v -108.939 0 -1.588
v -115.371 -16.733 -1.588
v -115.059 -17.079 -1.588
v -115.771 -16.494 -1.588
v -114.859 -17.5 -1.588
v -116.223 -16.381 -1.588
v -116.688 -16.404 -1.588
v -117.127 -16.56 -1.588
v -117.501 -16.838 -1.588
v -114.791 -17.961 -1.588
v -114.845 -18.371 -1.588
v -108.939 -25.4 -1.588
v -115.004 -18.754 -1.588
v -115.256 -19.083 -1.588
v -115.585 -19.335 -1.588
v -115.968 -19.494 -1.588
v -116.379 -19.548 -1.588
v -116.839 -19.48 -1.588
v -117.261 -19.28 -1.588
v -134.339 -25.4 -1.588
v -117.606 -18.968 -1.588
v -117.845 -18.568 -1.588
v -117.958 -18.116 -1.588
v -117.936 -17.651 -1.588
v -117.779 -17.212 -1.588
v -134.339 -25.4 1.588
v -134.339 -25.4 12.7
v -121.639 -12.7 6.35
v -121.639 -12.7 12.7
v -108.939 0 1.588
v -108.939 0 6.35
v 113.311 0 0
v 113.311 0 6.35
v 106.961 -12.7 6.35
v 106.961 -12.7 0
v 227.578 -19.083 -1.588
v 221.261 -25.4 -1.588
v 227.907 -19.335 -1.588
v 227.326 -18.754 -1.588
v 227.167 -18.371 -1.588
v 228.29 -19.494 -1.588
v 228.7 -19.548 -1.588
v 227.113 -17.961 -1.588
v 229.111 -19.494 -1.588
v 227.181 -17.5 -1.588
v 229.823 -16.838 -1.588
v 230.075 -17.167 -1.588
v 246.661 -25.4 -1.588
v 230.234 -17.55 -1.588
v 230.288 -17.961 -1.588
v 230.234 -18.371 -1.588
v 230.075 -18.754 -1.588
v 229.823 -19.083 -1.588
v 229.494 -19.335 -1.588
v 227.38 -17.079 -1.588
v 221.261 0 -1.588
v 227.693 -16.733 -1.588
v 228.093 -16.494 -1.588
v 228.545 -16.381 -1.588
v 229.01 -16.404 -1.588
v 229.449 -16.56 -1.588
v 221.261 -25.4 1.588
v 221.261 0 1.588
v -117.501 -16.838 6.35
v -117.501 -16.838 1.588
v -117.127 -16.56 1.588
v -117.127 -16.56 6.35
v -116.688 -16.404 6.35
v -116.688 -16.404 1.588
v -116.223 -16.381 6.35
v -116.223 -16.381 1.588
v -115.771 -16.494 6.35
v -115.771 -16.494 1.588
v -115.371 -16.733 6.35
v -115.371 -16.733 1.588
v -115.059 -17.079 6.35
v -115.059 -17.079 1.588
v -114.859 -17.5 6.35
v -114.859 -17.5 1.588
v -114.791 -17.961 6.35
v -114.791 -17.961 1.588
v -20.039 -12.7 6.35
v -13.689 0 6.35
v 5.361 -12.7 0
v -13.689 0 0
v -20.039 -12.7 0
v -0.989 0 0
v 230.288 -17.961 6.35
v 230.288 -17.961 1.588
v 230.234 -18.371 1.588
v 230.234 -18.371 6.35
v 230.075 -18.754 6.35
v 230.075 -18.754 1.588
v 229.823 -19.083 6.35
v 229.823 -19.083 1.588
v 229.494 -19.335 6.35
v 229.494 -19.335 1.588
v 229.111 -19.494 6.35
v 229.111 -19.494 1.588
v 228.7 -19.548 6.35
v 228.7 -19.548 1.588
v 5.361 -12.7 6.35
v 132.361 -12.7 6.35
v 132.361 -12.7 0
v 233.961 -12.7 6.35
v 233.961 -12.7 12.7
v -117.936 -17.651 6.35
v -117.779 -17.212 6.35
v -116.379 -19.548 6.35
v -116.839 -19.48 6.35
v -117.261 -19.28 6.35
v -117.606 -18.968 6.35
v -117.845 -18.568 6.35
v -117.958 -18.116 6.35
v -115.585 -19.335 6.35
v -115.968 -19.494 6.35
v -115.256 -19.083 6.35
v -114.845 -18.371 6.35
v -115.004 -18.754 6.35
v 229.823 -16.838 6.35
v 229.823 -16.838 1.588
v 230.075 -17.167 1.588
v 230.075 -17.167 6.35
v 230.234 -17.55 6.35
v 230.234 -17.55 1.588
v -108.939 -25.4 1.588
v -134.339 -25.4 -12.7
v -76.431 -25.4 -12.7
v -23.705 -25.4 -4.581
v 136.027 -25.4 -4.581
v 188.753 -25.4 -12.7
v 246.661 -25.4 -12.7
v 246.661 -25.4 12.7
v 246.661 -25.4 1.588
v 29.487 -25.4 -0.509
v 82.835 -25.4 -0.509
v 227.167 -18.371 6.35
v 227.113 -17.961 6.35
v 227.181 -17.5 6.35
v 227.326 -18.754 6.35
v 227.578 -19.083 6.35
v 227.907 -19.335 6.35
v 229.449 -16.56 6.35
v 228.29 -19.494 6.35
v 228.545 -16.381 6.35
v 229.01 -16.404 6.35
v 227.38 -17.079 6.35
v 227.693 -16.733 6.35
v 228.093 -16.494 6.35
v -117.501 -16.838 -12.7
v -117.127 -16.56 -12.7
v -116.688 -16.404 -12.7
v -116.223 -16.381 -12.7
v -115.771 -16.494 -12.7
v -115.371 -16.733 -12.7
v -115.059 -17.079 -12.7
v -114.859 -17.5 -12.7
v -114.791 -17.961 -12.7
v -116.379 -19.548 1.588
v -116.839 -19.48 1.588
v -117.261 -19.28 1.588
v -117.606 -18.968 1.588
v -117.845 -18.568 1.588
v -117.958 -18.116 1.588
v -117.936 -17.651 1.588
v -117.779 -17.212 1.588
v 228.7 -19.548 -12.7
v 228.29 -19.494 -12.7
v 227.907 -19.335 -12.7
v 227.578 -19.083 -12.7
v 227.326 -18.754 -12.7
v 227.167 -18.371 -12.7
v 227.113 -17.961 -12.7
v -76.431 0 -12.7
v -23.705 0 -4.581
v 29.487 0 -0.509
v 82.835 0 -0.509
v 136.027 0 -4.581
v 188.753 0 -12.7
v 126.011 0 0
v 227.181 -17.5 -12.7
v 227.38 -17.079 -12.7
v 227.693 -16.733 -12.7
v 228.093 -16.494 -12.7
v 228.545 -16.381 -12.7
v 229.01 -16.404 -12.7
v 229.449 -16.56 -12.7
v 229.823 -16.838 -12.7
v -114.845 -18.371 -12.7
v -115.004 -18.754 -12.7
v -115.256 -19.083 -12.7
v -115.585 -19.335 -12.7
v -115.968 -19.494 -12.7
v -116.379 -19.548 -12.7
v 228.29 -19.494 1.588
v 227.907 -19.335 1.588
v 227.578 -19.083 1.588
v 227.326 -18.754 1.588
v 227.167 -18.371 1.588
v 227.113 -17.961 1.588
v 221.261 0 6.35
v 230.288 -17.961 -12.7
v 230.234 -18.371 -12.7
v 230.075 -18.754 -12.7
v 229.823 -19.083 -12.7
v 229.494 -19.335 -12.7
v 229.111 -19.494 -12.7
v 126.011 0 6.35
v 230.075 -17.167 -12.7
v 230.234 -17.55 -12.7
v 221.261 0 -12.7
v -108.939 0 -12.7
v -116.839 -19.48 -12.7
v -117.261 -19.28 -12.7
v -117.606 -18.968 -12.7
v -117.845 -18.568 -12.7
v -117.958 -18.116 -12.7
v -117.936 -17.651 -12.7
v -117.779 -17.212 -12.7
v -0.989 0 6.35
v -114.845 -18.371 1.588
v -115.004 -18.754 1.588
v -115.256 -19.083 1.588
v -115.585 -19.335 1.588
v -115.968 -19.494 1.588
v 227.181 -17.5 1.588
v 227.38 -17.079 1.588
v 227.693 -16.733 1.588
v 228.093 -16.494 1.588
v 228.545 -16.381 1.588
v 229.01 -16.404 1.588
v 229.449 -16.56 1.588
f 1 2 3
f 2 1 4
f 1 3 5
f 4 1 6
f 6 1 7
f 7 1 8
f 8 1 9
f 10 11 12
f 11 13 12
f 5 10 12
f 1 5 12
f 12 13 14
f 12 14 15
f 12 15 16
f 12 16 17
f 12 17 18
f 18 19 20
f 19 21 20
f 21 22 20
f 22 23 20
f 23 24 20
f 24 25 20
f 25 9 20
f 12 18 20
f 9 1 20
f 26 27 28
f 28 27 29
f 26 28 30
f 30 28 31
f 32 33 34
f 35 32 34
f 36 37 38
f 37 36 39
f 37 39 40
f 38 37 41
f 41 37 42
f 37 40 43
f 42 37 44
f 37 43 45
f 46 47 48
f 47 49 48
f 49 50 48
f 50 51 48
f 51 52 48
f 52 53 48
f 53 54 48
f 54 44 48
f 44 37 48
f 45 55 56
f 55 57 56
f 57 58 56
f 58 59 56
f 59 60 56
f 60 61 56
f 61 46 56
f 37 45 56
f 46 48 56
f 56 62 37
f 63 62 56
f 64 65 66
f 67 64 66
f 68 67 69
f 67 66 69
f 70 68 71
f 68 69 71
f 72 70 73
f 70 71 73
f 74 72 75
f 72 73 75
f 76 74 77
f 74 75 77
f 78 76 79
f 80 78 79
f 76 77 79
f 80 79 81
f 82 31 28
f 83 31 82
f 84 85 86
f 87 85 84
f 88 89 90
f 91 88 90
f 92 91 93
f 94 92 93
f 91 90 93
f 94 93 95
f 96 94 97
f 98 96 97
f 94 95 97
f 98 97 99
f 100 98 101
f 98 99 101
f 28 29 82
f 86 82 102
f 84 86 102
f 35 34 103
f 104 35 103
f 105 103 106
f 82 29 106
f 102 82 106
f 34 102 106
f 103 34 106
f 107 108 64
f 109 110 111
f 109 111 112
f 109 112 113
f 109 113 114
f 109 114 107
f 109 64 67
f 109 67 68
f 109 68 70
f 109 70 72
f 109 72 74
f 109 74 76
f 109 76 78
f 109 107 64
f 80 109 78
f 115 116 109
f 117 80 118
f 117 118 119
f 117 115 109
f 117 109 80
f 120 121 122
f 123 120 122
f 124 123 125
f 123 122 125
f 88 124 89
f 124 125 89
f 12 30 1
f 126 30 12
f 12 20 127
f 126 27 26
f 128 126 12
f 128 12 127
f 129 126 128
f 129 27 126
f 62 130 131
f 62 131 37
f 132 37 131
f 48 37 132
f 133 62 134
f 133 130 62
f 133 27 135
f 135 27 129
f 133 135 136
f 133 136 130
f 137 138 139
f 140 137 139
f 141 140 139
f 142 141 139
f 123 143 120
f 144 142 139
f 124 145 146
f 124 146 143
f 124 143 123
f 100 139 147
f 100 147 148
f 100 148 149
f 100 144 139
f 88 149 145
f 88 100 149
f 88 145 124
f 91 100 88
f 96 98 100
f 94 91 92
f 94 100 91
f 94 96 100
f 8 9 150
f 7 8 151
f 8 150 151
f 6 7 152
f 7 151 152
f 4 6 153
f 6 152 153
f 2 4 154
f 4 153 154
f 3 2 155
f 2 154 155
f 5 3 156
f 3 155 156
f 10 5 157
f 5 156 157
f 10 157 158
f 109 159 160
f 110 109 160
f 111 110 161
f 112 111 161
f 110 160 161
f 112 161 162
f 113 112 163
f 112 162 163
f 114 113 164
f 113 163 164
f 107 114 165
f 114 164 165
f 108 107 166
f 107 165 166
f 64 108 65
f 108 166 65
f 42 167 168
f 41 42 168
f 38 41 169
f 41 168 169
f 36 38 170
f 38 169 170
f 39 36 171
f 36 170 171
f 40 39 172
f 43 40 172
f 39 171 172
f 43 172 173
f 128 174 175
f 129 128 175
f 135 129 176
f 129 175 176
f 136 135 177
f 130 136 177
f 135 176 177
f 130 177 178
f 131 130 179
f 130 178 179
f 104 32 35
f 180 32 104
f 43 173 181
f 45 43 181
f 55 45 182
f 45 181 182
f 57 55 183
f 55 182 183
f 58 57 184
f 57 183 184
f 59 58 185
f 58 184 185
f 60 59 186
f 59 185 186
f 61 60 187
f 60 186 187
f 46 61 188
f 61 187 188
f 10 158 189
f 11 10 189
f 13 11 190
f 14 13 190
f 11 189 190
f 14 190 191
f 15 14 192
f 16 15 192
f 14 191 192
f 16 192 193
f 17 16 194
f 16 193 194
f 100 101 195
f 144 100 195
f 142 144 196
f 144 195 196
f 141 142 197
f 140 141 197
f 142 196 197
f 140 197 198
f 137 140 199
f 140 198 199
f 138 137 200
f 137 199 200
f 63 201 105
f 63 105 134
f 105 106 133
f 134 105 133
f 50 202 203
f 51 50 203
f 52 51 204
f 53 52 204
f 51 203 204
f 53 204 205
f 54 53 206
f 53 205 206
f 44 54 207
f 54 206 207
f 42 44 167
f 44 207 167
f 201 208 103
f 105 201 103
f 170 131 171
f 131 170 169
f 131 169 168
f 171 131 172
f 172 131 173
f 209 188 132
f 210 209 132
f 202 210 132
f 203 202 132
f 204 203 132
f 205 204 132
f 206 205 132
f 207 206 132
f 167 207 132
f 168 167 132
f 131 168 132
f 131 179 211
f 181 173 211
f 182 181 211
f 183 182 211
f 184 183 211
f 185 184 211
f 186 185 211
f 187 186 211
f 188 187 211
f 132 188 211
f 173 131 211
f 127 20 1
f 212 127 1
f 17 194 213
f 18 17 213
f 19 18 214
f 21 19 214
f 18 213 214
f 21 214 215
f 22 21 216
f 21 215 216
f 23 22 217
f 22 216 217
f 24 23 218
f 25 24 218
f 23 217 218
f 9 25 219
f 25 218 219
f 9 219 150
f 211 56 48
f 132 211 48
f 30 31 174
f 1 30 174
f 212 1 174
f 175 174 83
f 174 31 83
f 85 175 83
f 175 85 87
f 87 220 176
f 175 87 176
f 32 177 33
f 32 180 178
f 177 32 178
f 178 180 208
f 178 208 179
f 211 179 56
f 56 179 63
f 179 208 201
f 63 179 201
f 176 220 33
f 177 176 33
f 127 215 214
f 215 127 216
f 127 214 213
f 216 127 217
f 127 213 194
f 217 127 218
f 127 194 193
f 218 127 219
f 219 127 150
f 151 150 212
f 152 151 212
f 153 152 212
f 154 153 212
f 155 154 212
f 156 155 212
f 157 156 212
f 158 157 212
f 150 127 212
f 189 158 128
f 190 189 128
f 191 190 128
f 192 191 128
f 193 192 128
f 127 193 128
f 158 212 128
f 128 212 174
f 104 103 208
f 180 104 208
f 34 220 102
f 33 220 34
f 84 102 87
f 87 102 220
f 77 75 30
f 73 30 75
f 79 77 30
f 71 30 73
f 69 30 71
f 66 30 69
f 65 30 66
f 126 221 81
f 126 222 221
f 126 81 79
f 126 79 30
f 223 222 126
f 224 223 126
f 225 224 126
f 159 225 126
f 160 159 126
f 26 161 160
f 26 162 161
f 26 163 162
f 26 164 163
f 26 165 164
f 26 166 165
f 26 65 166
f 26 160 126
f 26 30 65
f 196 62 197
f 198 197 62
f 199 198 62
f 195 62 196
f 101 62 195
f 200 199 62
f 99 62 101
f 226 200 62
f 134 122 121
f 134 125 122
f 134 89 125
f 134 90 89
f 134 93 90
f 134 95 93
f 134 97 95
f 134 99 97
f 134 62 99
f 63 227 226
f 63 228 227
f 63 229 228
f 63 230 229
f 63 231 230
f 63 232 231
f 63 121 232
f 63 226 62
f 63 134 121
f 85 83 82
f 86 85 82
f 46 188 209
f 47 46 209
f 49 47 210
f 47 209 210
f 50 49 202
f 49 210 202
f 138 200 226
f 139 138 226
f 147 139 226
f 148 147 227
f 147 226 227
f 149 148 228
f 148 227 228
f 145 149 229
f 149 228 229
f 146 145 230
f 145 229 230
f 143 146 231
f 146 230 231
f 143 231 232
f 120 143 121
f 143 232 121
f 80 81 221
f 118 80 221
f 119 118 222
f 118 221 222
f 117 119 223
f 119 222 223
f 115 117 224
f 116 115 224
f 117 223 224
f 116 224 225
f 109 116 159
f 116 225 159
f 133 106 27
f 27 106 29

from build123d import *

# Parameters (mm, degrees)
F1_DEPTH  = 25.4
F2_W      = 25.4
F2_H      = 3.175
F3_DEPTH  = 25.4
F4_W      = 25.4
F4_H      = 3.175
F5_DEPTH  = 25.4
F7_DEPTH  = 25.4
F8_DEPTH  = 6.35
F10_DEPTH = 6.35
F13_DEPTH = 19.05


with BuildPart() as f1:
    # F0 (on Front) → F1 (new body)
    with BuildSketch(Plane.XZ):
        with BuildLine():
            Line((246.660952732, 12.7), (-134.339047268, 12.7))
            Line((-134.339047268, 12.7), (-134.339047268, -12.7))
            Line((-134.339047268, -12.7), (-76.4309399312, -12.7))
            ThreePointArc((-76.4309399312, -12.7), (56.160952732, 0), (188.7528453951, -12.7))
            Line((188.7528453951, -12.7), (246.660952732, -12.7))
            Line((246.660952732, -12.7), (246.660952732, 12.7))
        make_face()
    extrude(amount=F1_DEPTH)

    # F2 (on face) → F3 (cut)
    with BuildSketch(Plane.YZ.offset(246.660952732)):
        with Locations((-12.7, 0)):
            Rectangle(F2_W, F2_H)
    extrude(amount=-F3_DEPTH, mode=Mode.SUBTRACT)

    # F4 (on face) → F5 (cut)
    with BuildSketch(Plane(origin=(-134.339047268, 0, 0), x_dir=(0, -1, 0), z_dir=(-1, 0, 0))):
        with Locations((12.7, 0)):
            Rectangle(F4_W, F4_H)
    extrude(amount=-F5_DEPTH, mode=Mode.SUBTRACT)

    # F6 (on face) → F7 (cut)
    with BuildSketch(Plane.XY.offset(12.7)):
        Polygon((-134.339047268, 0), (-134.339047268, -25.4), (-121.639047268, -12.7), (-108.939047268, 0), align=None)
        Polygon((233.960952732, -12.7), (246.660952732, -25.4), (246.660952732, 0), (221.260952732, 0), align=None)
    extrude(amount=-F7_DEPTH, mode=Mode.SUBTRACT)

    # F6 (on face) → F8 (cut)
    with BuildSketch(Plane.XY.offset(12.7)):
        Polygon((-108.939047268, 0), (-121.639047268, -12.7), (233.960952732, -12.7), (221.260952732, 0), align=None)
    extrude(amount=-F8_DEPTH, mode=Mode.SUBTRACT)

    # F9 (on face) → F10 (cut)
    with BuildSketch(Plane.XY.offset(6.35)):
        Polygon((-0.989047268, 0), (-13.689047268, 0), (-20.039047268, -12.7), (5.360952732, -12.7), align=None)
        Polygon((126.010952732, 0), (113.310952732, 0), (106.960952732, -12.7), (132.360952732, -12.7), align=None)
    extrude(amount=-F10_DEPTH, mode=Mode.SUBTRACT)

    # F11 (on face) + F12 (on face) → F13 (cut)
    with BuildSketch(Plane(origin=(0, 0, -12.7), x_dir=(1, 0, 0), z_dir=(0, 0, -1))):
        with BuildLine():
            ThreePointArc((-116.3785350259, 19.5480122421), (-117.8451937838, 18.568022191), (-117.501067041, 16.837980227))
            Line((-117.501067041, 16.837980227), (-116.3785350259, 17.9605122421))
            Line((-116.3785350259, 17.9605122421), (-116.3785350259, 19.5480122421))
        make_face()
        with BuildLine():
            Line((-116.3785350259, 17.9605122421), (-114.7910350259, 17.9605122421))
            ThreePointArc((-114.7910350259, 17.9605122421), (-115.2560030108, 19.0830442573), (-116.3785350259, 19.5480122421))
            Line((-116.3785350259, 19.5480122421), (-116.3785350259, 17.9605122421))
        make_face()
        with BuildLine():
            ThreePointArc((-117.501067041, 16.837980227), (-115.771025077, 16.4938534843), (-114.7910350259, 17.9605122421))
            Line((-114.7910350259, 17.9605122421), (-116.3785350259, 17.9605122421))
            Line((-116.3785350259, 17.9605122421), (-117.501067041, 16.837980227))
        make_face()
    with BuildSketch(Plane(origin=(0, 0, -12.7), x_dir=(1, 0, 0), z_dir=(0, 0, -1))):
        with BuildLine():
            Line((228.7004404898, 17.9605122421), (229.822972505, 16.837980227))
            ThreePointArc((229.822972505, 16.837980227), (230.1670992477, 17.3530022933), (230.2879404898, 17.9605122421))
            ThreePointArc((230.2879404898, 17.9605122421), (229.822972505, 19.0830442573), (228.7004404898, 19.5480122421))
            Line((228.7004404898, 19.5480122421), (228.7004404898, 17.9605122421))
        make_face()
        with BuildLine():
            ThreePointArc((228.7004404898, 19.5480122421), (227.5779084747, 19.0830442573), (227.1129404898, 17.9605122421))
            Line((227.1129404898, 17.9605122421), (228.7004404898, 17.9605122421))
            Line((228.7004404898, 17.9605122421), (228.7004404898, 19.5480122421))
        make_face()
        with BuildLine():
            Line((228.7004404898, 17.9605122421), (227.1129404898, 17.9605122421))
            ThreePointArc((227.1129404898, 17.9605122421), (228.0929305409, 16.4938534843), (229.822972505, 16.837980227))
            Line((229.822972505, 16.837980227), (228.7004404898, 17.9605122421))
        make_face()
    extrude(amount=-F13_DEPTH, mode=Mode.SUBTRACT)


solid = f1.part
